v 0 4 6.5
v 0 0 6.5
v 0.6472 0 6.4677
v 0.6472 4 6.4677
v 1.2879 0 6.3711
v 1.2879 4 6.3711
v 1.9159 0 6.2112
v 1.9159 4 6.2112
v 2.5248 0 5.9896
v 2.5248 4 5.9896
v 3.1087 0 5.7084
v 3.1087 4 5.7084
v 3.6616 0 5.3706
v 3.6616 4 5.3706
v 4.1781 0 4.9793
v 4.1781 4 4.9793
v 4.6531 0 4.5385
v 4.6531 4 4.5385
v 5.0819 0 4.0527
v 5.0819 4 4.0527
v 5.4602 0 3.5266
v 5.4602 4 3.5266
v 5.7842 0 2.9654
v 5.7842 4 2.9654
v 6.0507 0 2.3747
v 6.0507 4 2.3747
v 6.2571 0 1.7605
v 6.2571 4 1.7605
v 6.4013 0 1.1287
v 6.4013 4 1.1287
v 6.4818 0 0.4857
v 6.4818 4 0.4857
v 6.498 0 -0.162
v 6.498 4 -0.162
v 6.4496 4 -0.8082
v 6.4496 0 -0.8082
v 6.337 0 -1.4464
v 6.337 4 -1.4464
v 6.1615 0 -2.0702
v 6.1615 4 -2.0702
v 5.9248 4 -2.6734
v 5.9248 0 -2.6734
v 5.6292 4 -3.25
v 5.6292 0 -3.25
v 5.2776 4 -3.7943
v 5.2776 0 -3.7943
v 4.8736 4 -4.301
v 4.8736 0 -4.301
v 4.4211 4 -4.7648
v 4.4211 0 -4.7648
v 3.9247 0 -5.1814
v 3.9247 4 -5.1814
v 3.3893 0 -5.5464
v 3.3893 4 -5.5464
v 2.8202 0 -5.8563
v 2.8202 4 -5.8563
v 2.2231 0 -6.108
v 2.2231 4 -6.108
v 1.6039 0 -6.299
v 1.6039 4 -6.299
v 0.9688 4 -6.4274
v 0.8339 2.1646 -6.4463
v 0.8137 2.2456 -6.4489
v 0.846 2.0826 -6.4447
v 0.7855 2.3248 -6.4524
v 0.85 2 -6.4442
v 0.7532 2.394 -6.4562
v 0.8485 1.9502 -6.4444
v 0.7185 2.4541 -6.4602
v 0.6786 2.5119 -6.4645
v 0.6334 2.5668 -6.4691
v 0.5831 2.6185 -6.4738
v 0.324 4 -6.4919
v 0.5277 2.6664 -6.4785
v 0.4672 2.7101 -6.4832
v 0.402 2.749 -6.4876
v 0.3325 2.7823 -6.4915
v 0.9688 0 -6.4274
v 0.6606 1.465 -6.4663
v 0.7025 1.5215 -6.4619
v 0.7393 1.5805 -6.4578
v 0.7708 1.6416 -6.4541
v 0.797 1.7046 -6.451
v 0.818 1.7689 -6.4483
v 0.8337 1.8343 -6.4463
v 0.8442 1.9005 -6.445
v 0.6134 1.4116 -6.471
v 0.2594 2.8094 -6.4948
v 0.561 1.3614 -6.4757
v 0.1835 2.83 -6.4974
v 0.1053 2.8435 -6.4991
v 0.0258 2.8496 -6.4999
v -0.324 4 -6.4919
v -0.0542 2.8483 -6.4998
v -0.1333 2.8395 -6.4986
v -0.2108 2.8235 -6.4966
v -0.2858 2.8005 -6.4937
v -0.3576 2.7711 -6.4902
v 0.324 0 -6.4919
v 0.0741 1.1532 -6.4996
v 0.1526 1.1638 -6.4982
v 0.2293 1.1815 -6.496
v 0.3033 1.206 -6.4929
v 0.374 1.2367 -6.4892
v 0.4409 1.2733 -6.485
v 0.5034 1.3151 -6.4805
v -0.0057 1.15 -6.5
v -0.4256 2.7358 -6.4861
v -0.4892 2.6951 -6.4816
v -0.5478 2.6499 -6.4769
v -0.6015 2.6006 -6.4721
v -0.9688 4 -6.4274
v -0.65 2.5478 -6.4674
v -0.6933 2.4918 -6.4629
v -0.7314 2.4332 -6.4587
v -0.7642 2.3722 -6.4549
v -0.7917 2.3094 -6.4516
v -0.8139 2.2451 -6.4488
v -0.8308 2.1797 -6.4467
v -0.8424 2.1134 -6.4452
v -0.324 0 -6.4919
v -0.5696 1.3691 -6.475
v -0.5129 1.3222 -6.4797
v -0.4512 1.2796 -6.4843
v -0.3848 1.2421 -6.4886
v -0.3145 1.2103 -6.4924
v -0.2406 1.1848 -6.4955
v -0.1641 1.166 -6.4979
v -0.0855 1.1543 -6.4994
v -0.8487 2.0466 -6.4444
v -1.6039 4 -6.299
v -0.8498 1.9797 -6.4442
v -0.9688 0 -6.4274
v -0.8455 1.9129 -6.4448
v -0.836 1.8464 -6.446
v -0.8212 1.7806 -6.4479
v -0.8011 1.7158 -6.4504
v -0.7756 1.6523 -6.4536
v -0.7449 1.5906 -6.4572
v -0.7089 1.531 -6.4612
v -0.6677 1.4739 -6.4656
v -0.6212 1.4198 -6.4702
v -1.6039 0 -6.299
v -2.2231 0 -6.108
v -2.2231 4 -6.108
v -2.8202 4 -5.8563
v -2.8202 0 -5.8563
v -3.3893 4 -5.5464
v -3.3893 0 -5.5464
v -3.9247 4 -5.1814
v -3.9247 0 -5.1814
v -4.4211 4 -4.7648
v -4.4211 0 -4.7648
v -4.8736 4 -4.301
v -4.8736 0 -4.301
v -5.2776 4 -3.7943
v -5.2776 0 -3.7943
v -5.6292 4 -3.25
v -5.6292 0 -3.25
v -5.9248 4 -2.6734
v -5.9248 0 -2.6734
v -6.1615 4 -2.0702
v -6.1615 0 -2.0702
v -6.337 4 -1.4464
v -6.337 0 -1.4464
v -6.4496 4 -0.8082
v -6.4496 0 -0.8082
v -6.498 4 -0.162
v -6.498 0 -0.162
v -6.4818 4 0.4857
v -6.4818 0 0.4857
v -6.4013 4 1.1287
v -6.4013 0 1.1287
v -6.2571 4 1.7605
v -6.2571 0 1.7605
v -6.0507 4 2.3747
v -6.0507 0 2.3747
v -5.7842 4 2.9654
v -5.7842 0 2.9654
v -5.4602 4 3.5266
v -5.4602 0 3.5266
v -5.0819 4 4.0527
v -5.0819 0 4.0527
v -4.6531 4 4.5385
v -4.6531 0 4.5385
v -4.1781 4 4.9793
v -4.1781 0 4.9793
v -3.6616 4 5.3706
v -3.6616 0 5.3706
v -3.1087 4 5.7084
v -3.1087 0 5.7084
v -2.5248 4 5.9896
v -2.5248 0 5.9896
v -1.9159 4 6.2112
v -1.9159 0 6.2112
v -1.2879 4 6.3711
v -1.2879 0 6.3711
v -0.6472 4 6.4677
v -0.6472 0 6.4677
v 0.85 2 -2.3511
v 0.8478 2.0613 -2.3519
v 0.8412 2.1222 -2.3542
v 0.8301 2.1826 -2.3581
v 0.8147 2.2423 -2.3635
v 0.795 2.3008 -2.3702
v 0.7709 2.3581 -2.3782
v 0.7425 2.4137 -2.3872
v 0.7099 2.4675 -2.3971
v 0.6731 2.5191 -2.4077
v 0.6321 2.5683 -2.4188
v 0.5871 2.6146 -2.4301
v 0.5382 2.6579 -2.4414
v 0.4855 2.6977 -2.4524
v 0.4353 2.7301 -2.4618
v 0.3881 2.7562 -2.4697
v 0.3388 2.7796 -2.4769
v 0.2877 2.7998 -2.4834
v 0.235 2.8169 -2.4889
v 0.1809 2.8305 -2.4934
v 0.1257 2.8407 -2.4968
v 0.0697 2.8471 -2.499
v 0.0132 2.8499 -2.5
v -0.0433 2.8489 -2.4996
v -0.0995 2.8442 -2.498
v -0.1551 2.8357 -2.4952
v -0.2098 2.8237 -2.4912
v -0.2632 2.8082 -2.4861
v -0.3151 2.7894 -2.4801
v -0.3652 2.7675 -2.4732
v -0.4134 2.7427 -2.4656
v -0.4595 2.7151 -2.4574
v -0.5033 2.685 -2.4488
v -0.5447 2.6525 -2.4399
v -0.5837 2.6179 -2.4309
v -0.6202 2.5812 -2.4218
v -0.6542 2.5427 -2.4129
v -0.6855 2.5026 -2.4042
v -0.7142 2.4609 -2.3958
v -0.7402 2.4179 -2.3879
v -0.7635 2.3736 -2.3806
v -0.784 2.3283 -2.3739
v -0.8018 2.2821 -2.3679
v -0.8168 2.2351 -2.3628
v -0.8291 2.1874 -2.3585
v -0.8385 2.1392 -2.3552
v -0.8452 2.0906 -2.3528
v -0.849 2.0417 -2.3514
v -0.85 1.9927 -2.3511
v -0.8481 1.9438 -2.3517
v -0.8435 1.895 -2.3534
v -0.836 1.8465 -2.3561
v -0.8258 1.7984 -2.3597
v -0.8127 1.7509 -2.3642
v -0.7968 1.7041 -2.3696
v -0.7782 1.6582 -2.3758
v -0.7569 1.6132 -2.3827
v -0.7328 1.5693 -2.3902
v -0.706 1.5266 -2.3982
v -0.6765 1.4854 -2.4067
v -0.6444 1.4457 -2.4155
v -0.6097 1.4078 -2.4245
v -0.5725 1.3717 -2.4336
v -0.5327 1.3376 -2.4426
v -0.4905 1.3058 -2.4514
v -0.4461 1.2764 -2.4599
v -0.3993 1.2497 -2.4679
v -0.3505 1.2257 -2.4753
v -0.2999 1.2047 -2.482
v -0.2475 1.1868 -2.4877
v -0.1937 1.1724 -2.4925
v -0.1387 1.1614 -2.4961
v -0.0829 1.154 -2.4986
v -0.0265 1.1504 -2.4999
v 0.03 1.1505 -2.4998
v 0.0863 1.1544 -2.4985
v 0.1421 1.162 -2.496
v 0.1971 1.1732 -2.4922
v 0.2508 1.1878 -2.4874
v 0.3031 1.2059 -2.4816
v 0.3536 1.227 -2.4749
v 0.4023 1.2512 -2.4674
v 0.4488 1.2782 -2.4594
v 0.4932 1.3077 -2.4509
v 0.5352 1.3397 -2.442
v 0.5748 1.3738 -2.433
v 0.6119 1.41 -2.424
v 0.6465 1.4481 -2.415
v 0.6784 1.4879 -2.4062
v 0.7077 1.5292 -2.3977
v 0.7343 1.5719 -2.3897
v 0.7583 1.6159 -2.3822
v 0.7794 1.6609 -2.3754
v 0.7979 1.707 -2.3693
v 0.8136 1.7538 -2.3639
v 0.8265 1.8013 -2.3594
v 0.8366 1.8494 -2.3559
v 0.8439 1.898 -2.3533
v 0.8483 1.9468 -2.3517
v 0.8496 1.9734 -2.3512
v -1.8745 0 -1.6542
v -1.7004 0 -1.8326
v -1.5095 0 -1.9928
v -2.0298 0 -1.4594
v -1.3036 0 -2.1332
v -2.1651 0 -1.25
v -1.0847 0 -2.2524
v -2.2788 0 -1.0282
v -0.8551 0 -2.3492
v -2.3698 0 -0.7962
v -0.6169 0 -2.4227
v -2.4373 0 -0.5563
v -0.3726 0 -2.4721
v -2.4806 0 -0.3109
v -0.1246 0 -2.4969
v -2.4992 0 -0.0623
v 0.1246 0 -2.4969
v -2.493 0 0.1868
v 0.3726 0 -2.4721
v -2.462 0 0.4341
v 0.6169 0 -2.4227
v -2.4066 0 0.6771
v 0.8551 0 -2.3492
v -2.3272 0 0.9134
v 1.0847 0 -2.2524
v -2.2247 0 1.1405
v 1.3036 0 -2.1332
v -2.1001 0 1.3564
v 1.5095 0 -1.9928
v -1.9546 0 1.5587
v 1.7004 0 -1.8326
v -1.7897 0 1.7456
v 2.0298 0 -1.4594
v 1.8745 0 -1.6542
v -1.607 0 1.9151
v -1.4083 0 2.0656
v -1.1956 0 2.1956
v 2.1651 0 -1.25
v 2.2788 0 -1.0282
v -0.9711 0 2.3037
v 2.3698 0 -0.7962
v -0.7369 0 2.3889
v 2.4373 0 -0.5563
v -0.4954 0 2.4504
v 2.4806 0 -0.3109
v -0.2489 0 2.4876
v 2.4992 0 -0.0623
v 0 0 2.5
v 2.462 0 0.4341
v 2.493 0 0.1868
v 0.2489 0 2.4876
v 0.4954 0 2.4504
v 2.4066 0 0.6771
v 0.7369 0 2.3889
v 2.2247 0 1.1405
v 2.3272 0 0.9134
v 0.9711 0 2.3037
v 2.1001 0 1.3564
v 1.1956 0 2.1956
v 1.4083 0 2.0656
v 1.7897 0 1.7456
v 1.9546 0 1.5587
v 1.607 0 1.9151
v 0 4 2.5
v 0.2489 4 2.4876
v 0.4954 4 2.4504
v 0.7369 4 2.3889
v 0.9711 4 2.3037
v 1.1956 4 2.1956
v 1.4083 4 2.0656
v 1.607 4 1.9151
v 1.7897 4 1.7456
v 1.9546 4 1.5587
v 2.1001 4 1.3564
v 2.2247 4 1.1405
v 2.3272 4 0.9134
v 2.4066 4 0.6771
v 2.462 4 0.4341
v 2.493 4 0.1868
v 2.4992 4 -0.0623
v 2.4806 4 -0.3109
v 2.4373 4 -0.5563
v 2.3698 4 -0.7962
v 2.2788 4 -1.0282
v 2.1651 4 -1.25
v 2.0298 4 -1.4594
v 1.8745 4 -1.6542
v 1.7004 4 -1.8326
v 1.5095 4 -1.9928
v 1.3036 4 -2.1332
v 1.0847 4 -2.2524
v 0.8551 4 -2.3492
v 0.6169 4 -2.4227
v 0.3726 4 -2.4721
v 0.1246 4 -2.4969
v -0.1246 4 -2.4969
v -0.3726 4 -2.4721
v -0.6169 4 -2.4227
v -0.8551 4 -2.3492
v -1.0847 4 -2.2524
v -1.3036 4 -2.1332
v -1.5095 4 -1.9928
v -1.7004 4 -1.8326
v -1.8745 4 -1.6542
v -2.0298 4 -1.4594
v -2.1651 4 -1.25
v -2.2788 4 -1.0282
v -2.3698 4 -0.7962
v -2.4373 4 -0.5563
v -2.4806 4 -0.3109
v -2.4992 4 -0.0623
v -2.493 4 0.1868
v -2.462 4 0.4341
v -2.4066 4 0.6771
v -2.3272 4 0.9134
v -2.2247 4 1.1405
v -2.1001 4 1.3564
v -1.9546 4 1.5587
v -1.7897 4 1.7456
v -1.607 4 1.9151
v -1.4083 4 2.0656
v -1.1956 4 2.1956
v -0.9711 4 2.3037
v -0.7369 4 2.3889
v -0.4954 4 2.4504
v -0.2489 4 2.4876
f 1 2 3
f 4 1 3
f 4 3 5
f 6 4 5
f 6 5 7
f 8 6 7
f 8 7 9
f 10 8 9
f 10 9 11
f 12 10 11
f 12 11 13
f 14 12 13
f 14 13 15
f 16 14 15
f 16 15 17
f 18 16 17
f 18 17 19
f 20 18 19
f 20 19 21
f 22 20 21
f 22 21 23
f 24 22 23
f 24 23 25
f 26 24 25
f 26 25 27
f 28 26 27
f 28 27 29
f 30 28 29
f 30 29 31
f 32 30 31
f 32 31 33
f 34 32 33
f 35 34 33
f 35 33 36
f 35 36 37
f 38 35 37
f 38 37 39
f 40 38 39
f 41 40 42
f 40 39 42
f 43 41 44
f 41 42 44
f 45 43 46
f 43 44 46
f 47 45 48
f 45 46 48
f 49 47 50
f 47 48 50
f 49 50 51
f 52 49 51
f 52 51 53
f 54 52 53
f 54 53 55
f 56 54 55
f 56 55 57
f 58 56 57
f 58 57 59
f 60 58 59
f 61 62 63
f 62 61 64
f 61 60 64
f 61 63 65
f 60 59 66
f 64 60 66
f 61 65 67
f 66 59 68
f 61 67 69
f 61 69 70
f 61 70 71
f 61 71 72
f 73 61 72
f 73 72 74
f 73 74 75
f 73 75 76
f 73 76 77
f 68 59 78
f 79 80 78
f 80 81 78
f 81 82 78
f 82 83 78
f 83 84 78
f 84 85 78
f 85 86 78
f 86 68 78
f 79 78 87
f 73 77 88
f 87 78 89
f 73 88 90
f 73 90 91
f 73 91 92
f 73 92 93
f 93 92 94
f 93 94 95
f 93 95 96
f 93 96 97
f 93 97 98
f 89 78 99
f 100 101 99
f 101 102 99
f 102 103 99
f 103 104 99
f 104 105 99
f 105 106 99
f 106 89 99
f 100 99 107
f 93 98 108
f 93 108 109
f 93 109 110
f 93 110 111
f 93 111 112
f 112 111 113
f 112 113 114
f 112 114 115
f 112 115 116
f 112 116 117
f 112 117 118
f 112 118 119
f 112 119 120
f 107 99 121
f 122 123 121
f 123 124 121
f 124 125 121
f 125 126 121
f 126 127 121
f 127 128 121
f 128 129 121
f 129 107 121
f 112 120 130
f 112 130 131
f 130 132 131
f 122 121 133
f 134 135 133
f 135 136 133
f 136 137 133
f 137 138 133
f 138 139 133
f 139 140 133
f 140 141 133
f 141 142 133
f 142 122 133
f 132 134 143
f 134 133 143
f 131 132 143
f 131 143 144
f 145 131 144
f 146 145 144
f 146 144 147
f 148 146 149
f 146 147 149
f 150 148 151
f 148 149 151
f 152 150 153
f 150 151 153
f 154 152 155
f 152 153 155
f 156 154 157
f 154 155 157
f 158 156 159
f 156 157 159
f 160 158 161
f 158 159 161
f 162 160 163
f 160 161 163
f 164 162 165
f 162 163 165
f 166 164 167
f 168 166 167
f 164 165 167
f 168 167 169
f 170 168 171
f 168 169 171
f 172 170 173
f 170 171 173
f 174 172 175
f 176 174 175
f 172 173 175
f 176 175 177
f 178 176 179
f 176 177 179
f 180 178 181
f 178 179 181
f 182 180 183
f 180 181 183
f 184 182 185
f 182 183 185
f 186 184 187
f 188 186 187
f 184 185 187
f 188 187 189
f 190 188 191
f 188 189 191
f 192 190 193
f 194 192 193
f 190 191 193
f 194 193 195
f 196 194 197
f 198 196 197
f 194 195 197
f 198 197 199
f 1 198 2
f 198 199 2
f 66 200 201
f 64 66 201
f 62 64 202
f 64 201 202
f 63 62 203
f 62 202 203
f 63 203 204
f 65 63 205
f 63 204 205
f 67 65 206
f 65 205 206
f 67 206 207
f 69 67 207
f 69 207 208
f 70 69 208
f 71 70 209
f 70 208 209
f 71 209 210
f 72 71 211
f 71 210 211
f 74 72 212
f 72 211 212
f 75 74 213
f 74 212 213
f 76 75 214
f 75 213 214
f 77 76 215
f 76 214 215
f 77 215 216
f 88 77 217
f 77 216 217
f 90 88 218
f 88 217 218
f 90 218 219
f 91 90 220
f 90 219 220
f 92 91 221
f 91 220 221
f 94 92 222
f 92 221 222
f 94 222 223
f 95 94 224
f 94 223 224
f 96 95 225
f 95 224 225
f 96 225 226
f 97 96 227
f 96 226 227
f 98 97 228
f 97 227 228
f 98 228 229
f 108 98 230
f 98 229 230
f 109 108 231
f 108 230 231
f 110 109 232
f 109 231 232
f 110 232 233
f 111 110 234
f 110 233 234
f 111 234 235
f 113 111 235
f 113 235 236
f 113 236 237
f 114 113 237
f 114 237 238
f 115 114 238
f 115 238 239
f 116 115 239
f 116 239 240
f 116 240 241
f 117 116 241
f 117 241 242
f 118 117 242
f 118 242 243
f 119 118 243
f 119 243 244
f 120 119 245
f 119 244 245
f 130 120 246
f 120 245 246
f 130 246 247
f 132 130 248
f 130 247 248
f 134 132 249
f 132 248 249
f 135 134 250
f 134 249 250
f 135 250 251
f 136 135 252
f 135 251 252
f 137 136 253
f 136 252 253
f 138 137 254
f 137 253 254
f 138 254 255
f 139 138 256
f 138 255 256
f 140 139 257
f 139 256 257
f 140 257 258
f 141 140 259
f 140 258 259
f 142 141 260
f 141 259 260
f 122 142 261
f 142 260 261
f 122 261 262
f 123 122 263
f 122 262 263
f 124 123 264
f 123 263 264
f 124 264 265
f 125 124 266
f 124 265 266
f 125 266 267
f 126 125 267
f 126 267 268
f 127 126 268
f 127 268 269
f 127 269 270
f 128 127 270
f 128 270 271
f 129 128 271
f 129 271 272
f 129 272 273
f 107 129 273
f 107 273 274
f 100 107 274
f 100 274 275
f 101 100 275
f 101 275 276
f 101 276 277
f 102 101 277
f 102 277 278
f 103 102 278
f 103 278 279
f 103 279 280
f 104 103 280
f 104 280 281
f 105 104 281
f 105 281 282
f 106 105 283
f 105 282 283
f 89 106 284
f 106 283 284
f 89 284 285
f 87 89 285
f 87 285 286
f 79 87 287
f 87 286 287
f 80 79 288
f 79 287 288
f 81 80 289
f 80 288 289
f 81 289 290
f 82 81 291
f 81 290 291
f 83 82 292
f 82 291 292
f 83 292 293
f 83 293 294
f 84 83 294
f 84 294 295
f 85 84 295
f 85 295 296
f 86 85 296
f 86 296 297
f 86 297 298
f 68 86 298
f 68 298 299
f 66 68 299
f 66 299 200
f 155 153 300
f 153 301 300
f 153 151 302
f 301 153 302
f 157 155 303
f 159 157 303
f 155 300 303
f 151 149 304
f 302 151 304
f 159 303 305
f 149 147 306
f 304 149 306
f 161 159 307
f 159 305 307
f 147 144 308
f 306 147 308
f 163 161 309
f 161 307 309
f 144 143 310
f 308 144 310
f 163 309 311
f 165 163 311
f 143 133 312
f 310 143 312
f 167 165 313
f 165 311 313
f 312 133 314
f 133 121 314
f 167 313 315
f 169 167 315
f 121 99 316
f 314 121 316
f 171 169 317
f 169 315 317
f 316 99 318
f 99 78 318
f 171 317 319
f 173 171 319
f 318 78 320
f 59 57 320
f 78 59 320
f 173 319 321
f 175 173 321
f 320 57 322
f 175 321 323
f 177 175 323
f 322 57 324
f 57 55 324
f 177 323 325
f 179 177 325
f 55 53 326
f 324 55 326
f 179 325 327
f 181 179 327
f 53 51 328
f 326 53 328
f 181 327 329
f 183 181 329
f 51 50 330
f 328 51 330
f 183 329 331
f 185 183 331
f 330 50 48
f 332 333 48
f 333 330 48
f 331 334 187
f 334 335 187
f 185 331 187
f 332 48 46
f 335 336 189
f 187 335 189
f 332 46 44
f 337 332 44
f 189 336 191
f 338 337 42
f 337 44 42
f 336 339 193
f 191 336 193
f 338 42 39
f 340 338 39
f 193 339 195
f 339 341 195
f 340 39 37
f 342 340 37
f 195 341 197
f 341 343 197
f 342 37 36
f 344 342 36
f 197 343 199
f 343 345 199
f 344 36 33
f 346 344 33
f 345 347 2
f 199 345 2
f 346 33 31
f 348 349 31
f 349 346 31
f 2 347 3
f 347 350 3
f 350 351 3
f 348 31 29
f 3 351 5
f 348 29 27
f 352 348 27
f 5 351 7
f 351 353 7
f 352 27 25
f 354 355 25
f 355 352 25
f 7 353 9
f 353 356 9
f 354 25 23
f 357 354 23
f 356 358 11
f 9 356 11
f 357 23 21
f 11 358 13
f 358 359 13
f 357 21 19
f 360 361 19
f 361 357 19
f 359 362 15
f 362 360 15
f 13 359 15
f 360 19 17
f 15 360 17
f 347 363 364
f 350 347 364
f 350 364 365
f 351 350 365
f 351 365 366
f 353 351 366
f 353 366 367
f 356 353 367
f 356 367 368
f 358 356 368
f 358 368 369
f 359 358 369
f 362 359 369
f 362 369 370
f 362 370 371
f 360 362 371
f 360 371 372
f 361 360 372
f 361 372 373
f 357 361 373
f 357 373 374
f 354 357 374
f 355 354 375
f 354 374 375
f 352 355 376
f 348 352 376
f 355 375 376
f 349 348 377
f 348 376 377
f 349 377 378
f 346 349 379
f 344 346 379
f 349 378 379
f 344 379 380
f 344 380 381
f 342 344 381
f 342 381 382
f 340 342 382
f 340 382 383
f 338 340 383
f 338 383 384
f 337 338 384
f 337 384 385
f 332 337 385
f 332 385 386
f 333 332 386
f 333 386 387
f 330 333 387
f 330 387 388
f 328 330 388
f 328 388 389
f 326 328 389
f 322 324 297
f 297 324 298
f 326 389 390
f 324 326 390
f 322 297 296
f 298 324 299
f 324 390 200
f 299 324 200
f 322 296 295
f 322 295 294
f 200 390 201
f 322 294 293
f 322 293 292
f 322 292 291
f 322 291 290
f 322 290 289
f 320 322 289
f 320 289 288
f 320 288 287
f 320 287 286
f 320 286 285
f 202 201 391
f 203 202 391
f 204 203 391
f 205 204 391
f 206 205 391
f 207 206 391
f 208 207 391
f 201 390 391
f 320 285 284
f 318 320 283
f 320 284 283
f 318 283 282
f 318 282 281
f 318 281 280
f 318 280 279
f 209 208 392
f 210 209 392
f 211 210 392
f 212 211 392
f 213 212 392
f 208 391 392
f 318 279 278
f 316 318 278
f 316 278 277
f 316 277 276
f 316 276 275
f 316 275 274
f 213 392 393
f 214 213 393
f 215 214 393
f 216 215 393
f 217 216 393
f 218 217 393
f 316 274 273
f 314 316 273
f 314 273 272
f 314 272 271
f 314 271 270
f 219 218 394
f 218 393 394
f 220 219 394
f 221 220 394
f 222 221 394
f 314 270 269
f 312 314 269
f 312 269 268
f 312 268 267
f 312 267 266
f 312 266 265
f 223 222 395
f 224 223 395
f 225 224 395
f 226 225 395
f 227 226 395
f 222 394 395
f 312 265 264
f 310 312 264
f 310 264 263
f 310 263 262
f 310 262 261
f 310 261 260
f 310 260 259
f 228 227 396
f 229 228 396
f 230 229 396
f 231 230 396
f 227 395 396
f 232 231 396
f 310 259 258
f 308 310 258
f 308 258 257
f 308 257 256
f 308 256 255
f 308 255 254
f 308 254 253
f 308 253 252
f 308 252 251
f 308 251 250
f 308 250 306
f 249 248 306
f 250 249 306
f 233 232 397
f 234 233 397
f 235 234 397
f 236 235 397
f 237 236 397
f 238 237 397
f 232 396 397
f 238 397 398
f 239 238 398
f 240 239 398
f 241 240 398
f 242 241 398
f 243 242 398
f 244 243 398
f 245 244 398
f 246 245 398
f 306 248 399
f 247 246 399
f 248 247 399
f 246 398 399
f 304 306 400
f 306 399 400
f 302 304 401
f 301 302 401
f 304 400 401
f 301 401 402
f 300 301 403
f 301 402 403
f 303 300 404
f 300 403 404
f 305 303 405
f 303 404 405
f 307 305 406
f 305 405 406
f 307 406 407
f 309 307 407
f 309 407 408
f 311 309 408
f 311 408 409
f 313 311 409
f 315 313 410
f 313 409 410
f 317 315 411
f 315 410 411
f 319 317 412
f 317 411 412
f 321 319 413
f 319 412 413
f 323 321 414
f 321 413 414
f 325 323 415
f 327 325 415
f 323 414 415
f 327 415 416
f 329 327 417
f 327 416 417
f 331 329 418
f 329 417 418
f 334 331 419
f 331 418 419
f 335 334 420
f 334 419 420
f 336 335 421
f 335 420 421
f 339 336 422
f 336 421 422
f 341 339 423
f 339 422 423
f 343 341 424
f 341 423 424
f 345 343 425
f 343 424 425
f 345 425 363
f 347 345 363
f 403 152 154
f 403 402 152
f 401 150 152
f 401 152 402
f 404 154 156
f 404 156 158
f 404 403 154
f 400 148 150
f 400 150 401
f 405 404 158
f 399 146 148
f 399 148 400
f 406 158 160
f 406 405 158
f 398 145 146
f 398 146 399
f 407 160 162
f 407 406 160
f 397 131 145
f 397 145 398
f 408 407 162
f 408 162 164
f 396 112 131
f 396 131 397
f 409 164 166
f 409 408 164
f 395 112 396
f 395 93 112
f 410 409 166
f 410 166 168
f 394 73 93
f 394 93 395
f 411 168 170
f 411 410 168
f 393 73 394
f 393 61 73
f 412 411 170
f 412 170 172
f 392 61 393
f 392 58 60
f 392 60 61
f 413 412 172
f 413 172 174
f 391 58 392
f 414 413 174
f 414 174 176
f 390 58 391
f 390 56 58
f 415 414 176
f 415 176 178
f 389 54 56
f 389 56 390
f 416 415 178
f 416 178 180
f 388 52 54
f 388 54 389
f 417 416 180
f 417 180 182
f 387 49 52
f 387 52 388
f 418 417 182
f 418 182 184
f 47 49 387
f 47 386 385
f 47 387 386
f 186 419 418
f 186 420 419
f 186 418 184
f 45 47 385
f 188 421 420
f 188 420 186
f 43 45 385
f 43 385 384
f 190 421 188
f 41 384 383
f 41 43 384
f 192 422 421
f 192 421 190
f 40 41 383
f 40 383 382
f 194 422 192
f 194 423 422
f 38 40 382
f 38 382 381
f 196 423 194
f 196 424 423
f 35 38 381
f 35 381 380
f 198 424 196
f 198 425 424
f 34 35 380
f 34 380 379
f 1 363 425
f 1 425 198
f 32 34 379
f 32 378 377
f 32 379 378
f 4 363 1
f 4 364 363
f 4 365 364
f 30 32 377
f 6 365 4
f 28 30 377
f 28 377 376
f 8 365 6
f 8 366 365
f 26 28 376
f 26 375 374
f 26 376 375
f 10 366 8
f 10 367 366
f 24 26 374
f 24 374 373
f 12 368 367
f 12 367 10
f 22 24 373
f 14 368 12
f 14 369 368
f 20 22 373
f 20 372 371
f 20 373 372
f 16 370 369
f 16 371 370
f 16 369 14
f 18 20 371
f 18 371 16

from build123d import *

# Parameters (mm, degrees)
SKETCH1_R           = 6.5
BOSS_EXTRUDE1_DEPTH = 4
SKETCH2_R           = 2.5
CUT_EXTRUDE1_DEPTH  = 11.024968828
SKETCH3_R           = 0.85
CUT_EXTRUDE2_DEPTH  = 11.024968828


with BuildPart() as part:
    # Sketch1 → Boss-Extrude1 (new body)
    with BuildSketch(Plane(origin=(0, 0, 0), x_dir=(1, 0, 0), z_dir=(0, 1, 0))):
        with Locations(Location((0, 0, 0), (0, 0, 270))):
            Circle(SKETCH1_R)
    extrude(amount=BOSS_EXTRUDE1_DEPTH)

    # Sketch2 → Cut-Extrude1 (cut, through all)
    with BuildSketch(Plane(origin=(0, 4, 0), x_dir=(1, 0, 0), z_dir=(0, 1, 0))):
        with Locations(Location((0, 0, 0), (0, 0, 270))):
            Circle(SKETCH2_R)
    extrude(amount=-CUT_EXTRUDE1_DEPTH, mode=Mode.SUBTRACT)

    # Sketch3 → Cut-Extrude2 (cut, through all)
    with BuildSketch(Plane.XY):
        with Locations((0, 2)):
            Circle(SKETCH3_R)
    extrude(amount=-CUT_EXTRUDE2_DEPTH, mode=Mode.SUBTRACT)


solid = part.part
